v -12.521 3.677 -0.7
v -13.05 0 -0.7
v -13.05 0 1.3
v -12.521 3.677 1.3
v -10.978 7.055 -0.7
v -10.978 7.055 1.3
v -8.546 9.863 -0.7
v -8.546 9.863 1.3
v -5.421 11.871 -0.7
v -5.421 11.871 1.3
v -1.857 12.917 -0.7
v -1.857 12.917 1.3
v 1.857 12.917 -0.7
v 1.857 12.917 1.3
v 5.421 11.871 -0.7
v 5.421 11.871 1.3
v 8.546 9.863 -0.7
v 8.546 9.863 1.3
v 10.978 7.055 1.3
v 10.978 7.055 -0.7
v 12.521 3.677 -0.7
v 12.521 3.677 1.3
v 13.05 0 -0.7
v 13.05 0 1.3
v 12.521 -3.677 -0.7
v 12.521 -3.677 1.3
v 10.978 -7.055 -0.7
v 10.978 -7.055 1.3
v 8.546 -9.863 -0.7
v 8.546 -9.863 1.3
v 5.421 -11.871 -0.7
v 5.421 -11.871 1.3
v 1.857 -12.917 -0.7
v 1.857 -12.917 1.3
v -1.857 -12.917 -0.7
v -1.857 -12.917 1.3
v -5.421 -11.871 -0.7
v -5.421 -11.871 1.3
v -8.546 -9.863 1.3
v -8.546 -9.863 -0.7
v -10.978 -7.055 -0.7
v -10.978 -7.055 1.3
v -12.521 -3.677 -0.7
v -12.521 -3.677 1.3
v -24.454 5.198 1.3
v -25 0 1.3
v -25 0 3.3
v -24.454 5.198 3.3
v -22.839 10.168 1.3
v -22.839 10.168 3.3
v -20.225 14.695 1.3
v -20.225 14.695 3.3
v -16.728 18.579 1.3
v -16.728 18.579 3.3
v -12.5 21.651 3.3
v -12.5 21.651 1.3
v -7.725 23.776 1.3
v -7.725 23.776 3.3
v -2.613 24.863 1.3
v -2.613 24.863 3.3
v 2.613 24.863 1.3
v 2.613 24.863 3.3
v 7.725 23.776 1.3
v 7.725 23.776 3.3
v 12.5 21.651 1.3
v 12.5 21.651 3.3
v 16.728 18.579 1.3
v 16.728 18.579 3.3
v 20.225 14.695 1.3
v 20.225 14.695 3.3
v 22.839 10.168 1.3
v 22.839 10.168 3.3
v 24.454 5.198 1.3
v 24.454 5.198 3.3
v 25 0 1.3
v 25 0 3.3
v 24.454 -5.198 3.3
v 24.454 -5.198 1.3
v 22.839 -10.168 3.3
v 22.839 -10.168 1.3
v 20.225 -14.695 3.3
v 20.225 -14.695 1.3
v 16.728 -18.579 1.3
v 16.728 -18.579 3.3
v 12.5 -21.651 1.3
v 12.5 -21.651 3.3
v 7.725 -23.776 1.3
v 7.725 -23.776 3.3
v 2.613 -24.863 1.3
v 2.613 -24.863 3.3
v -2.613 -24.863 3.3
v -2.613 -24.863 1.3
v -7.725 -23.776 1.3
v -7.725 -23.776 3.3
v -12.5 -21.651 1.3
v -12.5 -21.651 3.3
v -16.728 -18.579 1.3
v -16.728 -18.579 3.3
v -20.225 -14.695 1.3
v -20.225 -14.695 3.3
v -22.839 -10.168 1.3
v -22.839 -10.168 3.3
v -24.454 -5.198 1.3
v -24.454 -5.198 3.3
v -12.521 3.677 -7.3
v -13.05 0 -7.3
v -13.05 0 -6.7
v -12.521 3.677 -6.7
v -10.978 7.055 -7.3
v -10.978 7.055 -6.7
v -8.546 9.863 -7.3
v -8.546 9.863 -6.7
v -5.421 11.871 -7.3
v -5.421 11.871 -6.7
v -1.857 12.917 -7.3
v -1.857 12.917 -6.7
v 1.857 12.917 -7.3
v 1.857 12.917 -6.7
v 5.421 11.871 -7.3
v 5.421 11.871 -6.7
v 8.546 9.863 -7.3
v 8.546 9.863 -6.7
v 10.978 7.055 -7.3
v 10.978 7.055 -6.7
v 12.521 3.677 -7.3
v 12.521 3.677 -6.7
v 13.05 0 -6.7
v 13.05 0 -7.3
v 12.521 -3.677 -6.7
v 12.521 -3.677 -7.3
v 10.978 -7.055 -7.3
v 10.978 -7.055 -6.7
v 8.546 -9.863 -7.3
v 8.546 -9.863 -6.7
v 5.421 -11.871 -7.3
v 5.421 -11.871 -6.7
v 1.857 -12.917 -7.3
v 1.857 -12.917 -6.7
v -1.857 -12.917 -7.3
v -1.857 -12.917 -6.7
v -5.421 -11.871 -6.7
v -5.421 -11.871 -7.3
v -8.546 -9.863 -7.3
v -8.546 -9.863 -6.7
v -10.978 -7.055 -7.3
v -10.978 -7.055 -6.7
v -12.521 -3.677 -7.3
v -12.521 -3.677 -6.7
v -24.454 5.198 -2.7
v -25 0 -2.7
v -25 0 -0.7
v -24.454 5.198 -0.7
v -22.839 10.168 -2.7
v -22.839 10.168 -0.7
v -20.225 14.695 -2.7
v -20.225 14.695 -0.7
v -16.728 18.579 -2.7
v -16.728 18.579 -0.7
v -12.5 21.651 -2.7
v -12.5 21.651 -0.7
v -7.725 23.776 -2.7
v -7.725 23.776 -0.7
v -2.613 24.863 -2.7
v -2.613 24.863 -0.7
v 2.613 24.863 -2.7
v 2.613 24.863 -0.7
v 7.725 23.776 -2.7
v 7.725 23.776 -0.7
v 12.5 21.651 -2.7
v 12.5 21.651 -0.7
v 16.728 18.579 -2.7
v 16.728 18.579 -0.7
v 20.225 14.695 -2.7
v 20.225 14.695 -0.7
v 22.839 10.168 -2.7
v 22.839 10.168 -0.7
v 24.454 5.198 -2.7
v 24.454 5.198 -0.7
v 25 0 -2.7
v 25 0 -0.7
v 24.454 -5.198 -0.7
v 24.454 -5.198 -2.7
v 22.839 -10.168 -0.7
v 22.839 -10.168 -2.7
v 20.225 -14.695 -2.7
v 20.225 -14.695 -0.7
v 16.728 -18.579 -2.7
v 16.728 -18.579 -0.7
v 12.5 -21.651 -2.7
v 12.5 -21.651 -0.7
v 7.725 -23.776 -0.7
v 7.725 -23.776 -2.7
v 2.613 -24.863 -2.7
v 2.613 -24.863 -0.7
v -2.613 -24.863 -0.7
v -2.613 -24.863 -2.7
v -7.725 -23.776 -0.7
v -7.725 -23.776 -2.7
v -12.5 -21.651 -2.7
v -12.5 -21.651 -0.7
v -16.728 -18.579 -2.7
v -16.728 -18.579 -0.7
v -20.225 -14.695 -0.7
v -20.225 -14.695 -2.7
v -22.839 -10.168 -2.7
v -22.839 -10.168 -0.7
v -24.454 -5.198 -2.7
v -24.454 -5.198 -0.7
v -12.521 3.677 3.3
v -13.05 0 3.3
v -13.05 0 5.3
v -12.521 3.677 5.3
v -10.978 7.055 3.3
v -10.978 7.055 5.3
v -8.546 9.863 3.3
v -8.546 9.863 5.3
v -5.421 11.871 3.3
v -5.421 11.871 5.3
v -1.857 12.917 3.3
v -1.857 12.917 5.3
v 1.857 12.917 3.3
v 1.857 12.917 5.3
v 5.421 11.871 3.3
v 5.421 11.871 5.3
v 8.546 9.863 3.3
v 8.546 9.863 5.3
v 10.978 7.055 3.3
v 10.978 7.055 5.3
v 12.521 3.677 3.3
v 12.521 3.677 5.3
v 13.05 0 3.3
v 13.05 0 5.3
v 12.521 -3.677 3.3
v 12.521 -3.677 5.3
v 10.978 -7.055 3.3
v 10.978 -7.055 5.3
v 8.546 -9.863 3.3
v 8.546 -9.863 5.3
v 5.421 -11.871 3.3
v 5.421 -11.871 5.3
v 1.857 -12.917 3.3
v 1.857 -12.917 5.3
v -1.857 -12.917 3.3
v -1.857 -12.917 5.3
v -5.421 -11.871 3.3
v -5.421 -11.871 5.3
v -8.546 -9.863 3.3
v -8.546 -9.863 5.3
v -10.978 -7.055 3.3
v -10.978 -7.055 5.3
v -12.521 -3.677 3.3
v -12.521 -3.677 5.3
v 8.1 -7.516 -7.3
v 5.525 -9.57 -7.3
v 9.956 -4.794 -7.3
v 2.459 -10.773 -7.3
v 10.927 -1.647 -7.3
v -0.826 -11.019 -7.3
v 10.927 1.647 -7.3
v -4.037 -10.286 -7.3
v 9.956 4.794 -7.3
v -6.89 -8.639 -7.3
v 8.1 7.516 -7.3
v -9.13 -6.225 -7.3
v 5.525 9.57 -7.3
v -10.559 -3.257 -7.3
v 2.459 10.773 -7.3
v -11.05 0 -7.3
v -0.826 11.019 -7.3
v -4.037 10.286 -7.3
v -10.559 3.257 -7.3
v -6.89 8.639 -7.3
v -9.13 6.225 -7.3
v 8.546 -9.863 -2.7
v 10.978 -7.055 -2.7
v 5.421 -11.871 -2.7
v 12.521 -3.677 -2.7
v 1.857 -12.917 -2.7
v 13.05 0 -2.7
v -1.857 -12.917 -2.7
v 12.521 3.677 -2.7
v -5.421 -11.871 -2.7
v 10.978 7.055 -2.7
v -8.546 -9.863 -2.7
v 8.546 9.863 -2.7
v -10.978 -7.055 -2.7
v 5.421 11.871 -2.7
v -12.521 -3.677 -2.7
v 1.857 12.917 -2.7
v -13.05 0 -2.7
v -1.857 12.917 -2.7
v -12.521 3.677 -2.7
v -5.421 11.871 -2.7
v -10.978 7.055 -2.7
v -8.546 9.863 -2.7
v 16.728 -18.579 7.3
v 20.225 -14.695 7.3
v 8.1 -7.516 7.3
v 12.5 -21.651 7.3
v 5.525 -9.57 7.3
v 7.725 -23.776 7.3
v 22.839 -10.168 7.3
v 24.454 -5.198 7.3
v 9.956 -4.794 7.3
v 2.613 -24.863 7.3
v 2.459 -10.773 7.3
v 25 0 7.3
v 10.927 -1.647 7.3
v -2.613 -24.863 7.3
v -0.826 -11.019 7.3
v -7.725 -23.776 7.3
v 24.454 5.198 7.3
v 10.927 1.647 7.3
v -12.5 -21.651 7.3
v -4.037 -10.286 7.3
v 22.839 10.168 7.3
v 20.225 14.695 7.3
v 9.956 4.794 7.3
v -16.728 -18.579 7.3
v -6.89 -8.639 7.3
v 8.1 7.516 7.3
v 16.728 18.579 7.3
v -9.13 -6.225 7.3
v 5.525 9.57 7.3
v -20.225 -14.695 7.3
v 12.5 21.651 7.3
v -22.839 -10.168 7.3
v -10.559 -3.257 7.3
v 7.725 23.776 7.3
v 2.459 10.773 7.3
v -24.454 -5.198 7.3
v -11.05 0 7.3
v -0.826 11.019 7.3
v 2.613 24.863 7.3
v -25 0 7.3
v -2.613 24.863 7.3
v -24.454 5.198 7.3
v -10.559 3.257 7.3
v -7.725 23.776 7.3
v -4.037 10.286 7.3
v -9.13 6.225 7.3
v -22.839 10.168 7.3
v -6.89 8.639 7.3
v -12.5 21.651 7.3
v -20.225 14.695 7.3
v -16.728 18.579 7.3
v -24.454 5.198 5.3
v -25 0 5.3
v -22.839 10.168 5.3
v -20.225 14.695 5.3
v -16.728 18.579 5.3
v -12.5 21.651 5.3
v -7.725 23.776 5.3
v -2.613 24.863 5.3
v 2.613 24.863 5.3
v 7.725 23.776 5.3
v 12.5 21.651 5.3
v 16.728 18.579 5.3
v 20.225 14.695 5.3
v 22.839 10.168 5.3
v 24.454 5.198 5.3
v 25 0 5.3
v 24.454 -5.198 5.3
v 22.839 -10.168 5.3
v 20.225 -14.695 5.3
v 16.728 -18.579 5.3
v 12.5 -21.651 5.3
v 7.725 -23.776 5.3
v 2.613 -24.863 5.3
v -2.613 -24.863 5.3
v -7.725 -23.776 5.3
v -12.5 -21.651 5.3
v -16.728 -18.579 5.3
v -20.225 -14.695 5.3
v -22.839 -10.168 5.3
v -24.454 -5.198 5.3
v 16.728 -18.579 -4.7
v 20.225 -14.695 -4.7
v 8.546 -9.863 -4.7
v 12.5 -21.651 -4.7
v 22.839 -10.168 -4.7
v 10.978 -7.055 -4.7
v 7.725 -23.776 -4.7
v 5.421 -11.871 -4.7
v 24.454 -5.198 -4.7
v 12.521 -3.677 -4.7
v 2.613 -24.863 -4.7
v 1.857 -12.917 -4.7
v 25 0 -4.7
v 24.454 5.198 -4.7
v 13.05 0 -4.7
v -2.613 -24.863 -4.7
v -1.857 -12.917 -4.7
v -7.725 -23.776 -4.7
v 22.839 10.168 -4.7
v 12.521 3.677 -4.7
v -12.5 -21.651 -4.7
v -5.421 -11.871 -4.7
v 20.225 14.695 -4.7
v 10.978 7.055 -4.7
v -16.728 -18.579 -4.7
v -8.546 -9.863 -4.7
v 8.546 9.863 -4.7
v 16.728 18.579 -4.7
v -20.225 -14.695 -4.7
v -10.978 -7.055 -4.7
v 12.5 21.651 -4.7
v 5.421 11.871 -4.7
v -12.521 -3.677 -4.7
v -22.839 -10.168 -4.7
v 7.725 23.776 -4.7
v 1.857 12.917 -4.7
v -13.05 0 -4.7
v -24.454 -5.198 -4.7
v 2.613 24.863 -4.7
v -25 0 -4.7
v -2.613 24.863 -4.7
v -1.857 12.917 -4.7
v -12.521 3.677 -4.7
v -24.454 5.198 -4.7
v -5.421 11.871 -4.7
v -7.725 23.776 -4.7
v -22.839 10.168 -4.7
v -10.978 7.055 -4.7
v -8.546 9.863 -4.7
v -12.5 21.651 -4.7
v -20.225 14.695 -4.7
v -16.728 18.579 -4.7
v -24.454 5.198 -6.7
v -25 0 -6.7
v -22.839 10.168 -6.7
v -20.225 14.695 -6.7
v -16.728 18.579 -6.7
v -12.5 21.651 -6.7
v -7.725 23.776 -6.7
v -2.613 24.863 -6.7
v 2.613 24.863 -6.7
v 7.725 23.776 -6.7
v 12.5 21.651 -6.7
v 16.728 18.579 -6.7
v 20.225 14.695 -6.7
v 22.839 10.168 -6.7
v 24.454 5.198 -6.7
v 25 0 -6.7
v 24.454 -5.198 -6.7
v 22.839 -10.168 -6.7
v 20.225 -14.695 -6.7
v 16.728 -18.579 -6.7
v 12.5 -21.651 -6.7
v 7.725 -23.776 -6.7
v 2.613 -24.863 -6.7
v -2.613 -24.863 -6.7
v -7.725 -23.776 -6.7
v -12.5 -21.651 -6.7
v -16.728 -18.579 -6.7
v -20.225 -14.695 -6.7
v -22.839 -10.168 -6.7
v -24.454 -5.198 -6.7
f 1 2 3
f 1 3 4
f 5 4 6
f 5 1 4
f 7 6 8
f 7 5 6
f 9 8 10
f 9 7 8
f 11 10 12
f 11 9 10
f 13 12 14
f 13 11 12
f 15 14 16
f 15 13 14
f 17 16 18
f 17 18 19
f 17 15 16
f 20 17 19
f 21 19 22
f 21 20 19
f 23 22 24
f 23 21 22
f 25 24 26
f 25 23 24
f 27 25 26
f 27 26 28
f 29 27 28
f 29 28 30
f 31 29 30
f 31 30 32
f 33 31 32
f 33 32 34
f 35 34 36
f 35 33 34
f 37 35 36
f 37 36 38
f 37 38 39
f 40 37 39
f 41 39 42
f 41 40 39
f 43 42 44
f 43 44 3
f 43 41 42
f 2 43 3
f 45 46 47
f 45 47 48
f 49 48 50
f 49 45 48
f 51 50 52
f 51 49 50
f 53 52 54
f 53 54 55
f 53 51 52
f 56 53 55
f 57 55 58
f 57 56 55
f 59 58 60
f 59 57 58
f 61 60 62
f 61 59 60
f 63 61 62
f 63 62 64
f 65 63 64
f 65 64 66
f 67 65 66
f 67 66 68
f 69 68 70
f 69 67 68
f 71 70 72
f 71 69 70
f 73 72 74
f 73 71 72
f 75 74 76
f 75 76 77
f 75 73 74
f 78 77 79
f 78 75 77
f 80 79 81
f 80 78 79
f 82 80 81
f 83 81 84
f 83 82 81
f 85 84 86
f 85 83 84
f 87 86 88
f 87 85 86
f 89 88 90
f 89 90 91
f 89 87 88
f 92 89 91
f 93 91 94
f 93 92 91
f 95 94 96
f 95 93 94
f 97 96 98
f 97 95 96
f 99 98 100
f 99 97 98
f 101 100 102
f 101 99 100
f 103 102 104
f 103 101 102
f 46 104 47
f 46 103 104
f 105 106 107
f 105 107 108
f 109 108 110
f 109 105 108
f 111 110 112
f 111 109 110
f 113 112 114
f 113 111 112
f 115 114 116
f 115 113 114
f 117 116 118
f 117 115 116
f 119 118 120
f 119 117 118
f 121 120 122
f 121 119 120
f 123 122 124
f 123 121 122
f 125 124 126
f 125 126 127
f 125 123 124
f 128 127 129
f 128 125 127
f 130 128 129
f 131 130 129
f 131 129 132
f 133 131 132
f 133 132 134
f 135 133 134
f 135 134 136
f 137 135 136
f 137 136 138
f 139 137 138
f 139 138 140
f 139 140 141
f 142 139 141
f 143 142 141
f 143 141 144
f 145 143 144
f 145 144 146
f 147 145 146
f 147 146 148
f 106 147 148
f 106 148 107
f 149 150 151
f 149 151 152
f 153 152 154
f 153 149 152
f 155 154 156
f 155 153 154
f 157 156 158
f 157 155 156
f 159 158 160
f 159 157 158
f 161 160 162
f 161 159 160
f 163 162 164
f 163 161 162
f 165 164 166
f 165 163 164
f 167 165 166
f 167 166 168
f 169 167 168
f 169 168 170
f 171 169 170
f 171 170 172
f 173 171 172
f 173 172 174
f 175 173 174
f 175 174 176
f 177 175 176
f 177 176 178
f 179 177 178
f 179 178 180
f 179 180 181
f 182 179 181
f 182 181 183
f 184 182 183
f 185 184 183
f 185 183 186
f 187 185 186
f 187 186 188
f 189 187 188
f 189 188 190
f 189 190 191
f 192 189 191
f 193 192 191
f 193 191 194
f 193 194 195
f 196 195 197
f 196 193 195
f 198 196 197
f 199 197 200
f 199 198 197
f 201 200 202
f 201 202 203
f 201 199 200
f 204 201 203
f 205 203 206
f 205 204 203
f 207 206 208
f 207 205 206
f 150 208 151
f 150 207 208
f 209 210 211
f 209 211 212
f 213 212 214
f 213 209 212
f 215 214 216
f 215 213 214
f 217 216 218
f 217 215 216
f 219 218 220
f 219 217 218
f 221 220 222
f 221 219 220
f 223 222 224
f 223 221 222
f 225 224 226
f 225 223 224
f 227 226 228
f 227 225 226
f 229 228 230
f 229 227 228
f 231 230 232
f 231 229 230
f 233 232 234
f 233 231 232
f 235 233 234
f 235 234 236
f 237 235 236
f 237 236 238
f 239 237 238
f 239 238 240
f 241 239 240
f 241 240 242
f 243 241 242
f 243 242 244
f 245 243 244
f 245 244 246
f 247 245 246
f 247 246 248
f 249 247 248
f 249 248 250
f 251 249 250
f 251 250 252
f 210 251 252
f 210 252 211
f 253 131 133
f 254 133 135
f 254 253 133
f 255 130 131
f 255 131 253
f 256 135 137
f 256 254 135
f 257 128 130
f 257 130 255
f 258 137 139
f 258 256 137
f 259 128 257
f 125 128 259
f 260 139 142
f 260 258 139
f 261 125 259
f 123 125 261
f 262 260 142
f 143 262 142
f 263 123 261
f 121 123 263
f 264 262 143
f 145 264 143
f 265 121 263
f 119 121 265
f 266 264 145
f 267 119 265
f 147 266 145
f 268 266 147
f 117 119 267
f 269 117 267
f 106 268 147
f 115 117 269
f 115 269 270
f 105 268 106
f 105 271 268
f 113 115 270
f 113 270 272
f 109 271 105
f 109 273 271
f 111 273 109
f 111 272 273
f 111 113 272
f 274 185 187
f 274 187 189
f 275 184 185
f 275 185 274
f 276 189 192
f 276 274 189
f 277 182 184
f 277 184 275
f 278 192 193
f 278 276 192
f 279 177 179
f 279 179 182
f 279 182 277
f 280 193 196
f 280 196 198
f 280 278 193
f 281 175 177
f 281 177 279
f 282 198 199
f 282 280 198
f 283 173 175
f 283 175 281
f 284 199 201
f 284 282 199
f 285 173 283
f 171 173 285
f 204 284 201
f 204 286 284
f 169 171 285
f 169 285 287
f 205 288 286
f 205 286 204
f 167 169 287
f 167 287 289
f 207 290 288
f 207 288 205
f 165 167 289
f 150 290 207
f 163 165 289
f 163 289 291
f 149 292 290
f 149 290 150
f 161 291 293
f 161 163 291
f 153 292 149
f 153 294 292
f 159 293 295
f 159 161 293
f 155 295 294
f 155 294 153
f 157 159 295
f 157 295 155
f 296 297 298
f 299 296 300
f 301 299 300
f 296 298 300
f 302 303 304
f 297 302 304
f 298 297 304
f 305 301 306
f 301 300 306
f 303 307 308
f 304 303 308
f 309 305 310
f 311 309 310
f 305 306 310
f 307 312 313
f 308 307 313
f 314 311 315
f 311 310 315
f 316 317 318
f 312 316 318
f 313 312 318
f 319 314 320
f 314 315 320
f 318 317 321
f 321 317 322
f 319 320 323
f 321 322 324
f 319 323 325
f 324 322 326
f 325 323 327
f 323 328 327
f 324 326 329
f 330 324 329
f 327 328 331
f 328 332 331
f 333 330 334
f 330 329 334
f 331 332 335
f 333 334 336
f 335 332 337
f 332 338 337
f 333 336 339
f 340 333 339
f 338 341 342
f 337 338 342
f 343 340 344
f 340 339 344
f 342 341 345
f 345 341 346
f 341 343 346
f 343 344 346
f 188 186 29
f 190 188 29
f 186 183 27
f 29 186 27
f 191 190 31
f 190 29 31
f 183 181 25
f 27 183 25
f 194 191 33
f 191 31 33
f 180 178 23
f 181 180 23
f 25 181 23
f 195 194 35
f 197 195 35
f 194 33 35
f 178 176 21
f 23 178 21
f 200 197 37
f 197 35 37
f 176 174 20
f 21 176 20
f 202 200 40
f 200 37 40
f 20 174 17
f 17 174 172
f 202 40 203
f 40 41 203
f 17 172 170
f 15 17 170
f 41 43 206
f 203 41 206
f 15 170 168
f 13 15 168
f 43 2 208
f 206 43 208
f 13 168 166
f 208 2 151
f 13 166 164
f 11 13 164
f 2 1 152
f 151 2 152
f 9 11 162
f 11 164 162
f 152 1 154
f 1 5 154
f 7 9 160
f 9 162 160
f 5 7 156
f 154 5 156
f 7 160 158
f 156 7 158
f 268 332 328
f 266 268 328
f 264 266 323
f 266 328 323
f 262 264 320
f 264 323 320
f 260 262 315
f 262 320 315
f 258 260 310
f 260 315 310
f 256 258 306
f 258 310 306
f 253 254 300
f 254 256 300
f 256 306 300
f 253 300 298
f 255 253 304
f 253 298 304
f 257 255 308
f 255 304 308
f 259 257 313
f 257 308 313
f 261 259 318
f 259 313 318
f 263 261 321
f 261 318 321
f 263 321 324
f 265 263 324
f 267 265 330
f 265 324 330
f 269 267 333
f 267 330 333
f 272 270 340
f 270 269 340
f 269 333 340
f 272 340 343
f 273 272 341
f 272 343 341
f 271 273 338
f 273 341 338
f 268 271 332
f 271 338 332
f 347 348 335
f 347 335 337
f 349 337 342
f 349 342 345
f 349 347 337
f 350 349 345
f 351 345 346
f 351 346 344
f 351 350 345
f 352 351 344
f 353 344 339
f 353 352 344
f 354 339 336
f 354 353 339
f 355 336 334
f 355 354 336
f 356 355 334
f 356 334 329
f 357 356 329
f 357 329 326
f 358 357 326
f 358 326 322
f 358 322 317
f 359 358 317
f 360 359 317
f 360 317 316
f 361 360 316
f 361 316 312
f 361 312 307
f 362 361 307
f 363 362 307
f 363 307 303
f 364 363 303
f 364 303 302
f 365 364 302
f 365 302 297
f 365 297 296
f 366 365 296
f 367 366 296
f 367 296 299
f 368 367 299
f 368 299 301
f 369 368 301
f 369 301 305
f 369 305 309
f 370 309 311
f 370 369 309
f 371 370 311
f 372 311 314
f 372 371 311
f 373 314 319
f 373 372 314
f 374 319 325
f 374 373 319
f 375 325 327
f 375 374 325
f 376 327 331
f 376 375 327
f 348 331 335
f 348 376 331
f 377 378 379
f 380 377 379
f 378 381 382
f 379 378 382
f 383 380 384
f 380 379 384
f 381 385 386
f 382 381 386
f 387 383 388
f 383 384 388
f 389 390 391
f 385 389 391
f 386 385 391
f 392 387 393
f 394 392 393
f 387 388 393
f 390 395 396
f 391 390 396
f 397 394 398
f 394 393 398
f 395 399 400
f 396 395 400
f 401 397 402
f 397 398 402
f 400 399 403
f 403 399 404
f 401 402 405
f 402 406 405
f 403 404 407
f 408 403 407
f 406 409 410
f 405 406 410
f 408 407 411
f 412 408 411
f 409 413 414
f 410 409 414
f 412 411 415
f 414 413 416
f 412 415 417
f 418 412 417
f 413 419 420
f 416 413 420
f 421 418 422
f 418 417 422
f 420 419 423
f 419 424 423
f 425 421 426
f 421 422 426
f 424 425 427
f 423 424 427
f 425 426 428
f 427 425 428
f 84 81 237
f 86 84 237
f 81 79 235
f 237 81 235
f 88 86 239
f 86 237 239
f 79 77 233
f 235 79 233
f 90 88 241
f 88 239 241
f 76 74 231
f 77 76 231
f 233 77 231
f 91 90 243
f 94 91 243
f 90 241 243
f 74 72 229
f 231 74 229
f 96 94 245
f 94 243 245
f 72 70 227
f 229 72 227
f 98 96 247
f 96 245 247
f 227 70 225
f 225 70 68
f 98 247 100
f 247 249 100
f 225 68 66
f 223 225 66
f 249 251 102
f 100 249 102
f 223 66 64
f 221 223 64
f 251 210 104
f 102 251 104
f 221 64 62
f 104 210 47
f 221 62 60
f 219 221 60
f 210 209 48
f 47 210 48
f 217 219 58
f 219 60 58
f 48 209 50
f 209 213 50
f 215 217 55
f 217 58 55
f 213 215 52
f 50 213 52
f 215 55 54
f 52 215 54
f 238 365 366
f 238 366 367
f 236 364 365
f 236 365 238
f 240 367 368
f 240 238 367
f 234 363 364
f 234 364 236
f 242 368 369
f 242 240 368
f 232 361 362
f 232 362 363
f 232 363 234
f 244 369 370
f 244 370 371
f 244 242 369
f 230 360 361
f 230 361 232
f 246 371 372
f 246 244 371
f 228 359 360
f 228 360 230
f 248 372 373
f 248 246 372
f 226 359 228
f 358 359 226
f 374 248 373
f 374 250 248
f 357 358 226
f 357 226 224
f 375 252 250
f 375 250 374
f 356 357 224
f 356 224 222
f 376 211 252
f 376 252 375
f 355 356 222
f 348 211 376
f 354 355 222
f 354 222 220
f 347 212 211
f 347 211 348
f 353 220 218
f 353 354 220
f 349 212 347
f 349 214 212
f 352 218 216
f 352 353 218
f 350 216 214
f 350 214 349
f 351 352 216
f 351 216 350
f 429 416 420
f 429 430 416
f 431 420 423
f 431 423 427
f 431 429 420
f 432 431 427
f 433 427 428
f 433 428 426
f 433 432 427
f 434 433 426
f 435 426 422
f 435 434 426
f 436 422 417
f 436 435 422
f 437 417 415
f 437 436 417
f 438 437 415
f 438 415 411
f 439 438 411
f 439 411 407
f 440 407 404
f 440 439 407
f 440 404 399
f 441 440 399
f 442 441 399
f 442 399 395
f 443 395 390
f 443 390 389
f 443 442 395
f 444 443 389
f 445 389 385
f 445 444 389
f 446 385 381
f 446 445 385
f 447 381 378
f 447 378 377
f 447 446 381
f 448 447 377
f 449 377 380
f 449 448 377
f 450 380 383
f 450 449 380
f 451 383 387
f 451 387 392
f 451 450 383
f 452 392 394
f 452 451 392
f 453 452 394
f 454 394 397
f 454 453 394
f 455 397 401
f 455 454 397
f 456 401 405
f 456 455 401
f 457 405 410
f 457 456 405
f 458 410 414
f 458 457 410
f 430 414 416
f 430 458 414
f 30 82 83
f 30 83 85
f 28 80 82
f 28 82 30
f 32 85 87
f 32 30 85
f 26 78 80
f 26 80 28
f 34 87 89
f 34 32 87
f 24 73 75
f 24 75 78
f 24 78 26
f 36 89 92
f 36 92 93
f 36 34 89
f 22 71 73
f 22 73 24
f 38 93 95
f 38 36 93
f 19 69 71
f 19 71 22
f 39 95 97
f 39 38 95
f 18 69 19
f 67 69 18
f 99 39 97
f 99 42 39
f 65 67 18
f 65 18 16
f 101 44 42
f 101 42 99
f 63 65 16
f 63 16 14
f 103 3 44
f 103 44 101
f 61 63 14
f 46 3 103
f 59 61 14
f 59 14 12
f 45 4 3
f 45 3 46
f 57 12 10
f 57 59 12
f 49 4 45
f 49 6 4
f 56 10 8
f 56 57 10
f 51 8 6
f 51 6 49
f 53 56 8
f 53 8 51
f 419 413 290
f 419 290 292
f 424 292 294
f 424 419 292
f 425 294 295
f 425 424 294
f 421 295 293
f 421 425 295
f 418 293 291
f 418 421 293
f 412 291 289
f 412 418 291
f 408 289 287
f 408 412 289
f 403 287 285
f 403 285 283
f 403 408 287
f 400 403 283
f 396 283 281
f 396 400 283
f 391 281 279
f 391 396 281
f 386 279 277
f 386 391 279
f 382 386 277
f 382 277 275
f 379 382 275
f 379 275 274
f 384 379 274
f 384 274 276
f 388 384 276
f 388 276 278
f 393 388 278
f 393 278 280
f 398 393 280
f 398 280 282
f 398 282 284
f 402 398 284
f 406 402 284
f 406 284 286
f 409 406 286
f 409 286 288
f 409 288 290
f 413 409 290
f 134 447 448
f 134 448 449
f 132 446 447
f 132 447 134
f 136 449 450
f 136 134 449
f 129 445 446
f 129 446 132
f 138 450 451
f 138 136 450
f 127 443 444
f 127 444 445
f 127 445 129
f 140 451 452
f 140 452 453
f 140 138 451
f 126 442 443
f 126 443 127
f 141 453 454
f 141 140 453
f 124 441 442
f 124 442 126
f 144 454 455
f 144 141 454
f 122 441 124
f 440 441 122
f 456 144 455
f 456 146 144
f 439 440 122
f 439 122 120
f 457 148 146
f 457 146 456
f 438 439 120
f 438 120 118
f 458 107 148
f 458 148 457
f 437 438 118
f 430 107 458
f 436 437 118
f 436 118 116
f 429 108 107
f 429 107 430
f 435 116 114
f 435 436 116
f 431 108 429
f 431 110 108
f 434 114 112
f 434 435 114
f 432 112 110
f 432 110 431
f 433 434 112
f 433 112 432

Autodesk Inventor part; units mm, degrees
ref_plane "YZ Plane" through (0, 0, 0) normal (1, 0, 0) x (0, 1, 0)
ref_plane "XZ Plane" through (0, 0, 0) normal (0, 1, 0) x (-1, 0, 0)
ref_plane "XY Plane" through (0, 0, 0) normal (0, 0, 1) x (1, 0, 0)
sketch "Sketch1" plane through (0, 0, 0) normal (0, 1, 0) x (-1, 0, 0)
  line L0 (-11.05, -7.3) -> (11.05, -7.3)
  line L1 (11.05, -7.3) -> (11.05, 7.3)
  line L2 (11.05, 7.3) -> (-11.05, 7.3)
  line L3 (-11.05, 7.3) -> (-11.05, -7.3)
  line L4 (-11.05, -7.3) -> (11.05, 7.3) construction
  line L5 (11.05, -7.3) -> (-11.05, 7.3) construction
  line L6 (0, 3.6568) -> (0, -4.6339)
  line L7 (11.05, 7.3) -> (25, 7.3)
  line L8 (25, 7.3) -> (25, 5.3)
  line L9 (25, 5.3) -> (11.05, 5.3)
  line L10 (11.05, 5.3) -> (11.05, 7.3)
  line L11 (11.05, 7.3) -> (13.05, 7.3)
  line L12 (13.05, 7.3) -> (13.05, -7.3)
  line L13 (13.05, -7.3) -> (11.05, -7.3)
  line L14 (11.05, -7.3) -> (11.05, 7.3)
  line L15 (11.05, 1.3) -> (11.05, 3.3)
  line L16 (11.05, 3.3) -> (13.05, 3.3)
  line L17 (25, 1.3) -> (11.05, 1.3)
  line L18 (25, 3.3) -> (25, 1.3)
  line L19 (11.05, 3.3) -> (25, 3.3)
  line L20 (11.05, -2.7) -> (11.05, -0.7)
  line L21 (11.05, -0.7) -> (13.05, -0.7)
  line L22 (25, -2.7) -> (11.05, -2.7)
  line L23 (25, -0.7) -> (25, -2.7)
  line L24 (11.05, -0.7) -> (25, -0.7)
  line L25 (11.05, -6.7) -> (11.05, -4.7)
  line L26 (11.05, -4.7) -> (13.05, -4.7)
  line L27 (25, -6.7) -> (11.05, -6.7)
  line L28 (25, -4.7) -> (25, -6.7)
  line L29 (11.05, -4.7) -> (25, -4.7)
  point P0 (0, 0)
  dimension "d0" = 22.1
  dimension "d1" = 14.6
  dimension "d2" = 13.95
  dimension "d3" = 2
  dimension "d4" = 2
  dimension "d7" = 4
revolve "Revolution1" add sketch "Sketch1" angle 360 about axis through (0, 0, 3.6568) along (0, 0, -1) contours L1 L27 L12 L13 | L1 L26 L12 L27 | L7 L12 L9 L1 | L1 L22 L12 L26 | L12 L29 L28 L27 | L9 L12 L16 L1 | L7 L8 L9 L12 | L1 L21 L12 L22 | L16 L12 L17 L1 | L1 L17 L12 L21 | L12 L24 L23 L22 | L19 L18 L17 L12
properties part number "HeatSink-H14p6mm"
